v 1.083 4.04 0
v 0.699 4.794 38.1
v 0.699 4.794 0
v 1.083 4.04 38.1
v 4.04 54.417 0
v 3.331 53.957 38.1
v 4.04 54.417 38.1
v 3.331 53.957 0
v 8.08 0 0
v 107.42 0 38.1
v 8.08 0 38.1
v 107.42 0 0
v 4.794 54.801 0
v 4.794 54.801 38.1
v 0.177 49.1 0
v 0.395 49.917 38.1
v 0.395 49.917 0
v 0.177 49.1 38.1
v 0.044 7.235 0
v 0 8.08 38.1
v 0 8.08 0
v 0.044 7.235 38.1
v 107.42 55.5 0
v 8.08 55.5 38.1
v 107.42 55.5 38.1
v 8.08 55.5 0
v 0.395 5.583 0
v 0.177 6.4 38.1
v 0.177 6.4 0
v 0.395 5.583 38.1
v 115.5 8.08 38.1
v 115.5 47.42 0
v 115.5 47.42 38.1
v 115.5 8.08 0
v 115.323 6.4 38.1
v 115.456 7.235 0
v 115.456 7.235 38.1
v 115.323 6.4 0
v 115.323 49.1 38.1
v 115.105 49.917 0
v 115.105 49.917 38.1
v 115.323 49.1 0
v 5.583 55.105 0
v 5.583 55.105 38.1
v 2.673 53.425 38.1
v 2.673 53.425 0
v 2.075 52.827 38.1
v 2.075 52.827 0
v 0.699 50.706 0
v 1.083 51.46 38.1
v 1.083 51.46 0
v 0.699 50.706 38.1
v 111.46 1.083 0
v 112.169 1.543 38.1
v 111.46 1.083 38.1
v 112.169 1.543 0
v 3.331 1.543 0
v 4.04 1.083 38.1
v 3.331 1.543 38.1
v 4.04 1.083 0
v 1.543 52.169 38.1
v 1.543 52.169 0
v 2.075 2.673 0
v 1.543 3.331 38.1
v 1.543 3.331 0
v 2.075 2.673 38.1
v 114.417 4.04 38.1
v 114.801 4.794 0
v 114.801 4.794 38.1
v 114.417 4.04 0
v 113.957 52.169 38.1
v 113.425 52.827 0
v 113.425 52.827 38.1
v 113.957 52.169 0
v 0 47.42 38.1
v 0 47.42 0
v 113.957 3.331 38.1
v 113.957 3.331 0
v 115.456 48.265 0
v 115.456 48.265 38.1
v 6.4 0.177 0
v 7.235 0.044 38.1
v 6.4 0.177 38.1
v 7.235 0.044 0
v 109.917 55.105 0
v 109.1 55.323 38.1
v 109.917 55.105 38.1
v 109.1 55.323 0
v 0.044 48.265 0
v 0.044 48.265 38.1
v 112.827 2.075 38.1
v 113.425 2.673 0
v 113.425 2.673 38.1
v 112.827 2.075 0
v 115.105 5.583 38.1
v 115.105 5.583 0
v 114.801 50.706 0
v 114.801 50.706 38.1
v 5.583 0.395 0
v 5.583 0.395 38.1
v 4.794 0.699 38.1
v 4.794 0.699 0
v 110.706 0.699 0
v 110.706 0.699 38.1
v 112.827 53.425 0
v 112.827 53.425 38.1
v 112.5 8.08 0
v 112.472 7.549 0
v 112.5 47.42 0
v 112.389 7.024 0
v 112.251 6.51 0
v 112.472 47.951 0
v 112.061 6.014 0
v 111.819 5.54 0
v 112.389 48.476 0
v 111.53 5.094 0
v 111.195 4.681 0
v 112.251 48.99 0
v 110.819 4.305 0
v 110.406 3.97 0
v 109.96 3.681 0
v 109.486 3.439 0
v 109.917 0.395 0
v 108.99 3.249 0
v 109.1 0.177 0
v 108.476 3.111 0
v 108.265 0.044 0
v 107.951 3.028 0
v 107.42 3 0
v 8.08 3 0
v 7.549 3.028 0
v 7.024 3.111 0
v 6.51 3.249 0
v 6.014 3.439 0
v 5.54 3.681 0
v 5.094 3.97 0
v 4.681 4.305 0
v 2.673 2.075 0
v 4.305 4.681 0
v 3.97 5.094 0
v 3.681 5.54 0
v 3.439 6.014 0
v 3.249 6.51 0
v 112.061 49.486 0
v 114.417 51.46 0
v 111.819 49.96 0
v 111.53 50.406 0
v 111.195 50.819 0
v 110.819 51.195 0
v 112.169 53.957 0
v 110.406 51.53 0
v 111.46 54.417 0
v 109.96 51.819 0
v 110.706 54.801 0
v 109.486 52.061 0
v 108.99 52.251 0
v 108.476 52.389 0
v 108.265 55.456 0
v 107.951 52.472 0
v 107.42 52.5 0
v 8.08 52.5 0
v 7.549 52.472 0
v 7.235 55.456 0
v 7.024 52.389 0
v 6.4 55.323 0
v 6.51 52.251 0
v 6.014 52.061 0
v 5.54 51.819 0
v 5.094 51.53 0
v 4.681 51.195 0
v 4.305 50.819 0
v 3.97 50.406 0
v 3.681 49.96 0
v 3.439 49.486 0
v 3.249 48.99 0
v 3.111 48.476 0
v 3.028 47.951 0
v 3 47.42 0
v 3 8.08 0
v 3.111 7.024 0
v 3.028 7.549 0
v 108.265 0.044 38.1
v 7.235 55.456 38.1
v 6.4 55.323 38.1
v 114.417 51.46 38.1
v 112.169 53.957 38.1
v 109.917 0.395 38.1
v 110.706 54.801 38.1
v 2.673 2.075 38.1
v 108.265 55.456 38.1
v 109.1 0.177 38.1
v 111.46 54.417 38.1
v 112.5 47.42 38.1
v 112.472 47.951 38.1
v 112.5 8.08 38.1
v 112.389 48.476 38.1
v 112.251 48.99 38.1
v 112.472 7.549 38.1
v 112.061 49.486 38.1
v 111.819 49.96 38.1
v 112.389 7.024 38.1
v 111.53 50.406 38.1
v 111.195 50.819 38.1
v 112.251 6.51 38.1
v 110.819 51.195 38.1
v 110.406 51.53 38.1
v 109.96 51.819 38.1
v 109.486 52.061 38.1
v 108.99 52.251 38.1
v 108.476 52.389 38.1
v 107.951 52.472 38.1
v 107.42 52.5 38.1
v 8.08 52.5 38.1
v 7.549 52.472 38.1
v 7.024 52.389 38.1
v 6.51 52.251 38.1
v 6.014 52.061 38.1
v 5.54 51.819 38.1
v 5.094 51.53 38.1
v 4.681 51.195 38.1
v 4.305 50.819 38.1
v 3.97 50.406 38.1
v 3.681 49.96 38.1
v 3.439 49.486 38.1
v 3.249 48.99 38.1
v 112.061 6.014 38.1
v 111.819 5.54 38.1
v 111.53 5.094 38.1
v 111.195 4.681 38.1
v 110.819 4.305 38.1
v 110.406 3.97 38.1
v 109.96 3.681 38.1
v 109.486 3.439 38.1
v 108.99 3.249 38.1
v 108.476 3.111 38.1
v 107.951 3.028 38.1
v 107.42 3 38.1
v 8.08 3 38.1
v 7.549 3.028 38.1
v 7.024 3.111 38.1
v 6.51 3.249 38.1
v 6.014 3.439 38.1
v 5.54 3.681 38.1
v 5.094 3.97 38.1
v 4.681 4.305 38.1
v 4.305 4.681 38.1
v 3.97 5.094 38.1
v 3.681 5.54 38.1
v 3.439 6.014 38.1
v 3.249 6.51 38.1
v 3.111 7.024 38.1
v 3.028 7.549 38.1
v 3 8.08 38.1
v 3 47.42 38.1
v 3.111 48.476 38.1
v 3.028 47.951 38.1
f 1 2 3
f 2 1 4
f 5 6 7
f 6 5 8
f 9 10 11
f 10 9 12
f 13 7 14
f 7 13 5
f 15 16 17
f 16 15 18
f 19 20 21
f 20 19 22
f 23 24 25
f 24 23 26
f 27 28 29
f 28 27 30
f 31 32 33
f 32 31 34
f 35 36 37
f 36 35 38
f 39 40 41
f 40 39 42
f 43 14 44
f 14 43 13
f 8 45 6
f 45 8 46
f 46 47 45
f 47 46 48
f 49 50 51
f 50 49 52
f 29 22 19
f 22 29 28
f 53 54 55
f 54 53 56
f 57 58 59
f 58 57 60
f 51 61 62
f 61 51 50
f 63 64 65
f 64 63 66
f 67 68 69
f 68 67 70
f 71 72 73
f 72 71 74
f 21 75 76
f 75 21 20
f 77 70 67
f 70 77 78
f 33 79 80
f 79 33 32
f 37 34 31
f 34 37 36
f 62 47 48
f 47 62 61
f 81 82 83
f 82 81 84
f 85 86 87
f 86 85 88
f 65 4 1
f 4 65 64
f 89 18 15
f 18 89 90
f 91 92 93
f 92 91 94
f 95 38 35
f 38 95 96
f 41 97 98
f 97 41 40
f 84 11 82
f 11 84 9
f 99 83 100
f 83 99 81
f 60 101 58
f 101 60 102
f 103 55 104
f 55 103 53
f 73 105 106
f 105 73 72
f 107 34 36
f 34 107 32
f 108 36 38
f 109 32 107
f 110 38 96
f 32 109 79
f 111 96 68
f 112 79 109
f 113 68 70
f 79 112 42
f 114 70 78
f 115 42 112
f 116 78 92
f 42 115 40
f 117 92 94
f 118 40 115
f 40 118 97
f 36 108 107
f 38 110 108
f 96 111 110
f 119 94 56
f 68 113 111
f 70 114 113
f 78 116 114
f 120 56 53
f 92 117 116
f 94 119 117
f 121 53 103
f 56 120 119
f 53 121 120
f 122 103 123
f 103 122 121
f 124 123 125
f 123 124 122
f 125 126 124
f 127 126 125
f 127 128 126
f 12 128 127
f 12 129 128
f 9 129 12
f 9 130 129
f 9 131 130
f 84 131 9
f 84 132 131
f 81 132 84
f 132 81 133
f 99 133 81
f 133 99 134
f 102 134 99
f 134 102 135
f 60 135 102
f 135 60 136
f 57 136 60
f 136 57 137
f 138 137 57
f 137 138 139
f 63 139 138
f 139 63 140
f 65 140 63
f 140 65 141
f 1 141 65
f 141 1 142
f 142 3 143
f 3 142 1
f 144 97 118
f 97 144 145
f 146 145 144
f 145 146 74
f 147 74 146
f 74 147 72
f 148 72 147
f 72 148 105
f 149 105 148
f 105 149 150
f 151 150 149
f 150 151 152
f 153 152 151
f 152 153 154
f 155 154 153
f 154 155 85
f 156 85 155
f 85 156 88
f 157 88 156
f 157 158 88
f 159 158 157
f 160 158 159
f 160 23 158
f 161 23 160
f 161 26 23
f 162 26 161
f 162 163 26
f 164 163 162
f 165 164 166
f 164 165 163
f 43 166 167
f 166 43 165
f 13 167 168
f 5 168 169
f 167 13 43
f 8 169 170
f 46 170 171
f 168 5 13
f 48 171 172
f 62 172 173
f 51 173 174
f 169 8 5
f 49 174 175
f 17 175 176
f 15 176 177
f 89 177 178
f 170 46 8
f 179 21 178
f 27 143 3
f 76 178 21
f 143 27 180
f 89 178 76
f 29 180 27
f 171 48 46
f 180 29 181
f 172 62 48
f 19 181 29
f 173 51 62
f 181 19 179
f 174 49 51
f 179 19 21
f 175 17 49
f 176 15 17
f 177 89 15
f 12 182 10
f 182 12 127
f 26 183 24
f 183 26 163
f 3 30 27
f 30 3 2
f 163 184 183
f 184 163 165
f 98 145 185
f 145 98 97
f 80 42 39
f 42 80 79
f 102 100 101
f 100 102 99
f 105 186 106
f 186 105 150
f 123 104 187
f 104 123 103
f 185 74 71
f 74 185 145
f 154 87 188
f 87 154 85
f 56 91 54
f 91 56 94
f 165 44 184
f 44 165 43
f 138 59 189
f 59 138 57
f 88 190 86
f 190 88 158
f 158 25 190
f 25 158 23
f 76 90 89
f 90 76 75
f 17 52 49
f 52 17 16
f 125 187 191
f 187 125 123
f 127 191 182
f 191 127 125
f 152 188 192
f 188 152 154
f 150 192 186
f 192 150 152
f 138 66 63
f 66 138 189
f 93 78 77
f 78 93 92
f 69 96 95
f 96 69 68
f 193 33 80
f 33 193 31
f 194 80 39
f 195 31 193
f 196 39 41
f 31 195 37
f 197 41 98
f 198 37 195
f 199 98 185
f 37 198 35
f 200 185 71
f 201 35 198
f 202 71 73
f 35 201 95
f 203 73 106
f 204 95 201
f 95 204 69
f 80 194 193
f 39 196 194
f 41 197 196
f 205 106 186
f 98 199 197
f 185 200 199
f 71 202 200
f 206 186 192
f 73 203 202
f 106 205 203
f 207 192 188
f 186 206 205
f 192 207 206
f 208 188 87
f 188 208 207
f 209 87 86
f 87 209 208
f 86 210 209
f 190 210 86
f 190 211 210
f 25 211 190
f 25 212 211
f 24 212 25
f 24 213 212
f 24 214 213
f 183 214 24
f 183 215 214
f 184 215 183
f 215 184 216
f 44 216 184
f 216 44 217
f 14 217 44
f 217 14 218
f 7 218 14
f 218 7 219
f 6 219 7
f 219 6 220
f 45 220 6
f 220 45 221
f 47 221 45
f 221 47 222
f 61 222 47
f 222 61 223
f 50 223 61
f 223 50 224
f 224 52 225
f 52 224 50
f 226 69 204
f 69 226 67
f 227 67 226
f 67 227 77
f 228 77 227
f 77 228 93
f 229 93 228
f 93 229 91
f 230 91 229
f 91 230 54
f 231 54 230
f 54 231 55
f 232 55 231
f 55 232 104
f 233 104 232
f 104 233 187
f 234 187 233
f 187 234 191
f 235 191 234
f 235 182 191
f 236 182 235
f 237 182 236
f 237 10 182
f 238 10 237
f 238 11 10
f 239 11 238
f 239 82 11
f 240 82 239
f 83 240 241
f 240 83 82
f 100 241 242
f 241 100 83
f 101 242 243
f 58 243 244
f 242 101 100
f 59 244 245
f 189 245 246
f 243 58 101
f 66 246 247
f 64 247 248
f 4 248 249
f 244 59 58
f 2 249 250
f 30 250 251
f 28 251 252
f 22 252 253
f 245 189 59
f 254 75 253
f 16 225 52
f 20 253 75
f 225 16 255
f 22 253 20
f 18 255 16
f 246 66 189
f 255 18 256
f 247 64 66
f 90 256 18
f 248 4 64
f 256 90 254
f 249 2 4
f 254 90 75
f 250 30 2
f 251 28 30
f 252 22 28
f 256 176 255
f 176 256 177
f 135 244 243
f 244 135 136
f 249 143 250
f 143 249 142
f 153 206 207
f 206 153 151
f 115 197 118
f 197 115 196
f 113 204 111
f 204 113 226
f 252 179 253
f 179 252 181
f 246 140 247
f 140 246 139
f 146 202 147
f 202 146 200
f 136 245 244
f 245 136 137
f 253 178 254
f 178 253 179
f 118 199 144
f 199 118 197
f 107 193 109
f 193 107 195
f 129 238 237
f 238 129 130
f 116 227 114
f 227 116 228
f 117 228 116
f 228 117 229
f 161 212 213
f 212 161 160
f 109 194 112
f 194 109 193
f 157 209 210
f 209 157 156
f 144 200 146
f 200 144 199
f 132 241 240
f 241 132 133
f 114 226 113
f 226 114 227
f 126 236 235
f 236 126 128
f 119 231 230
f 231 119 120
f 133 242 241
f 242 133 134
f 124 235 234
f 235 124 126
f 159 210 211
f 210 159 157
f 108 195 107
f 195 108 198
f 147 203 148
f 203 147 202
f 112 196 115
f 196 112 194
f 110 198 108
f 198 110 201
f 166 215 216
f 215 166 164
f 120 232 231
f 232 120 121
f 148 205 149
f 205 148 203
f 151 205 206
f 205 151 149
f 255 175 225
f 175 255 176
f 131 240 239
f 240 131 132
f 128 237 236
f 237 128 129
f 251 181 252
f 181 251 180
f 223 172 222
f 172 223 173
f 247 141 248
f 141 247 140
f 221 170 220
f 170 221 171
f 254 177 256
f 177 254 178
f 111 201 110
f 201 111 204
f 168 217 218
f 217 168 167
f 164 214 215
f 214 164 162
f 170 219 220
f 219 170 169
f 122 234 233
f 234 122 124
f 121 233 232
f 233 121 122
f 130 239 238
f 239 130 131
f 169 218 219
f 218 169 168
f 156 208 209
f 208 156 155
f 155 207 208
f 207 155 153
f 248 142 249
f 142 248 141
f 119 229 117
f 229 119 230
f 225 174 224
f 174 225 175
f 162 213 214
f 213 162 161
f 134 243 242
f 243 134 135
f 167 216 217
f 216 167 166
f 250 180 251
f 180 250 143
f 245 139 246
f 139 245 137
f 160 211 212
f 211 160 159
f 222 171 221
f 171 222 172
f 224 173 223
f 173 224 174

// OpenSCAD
//Rain Gauge Extension
//Designed by Bryscus: Bryce B.

//Most measurements are for the inside dimensions
//since in this case those are the dimensions
//that really matter.

//Height
H=38.1;

//Wall thickness
W=3;    

//Inside Corner radius
R=5.08; 

//Inside Length
L=109.5;

//Inside Width
B=49.5;

difference(){
translate([R+W,R+W,0]) 
minkowski(){
	cube([L-2*R,B-2*R,H/2]); // Outside
	cylinder(r=R+W, h=H/2,$fn=60);
	}
translate([R+W,R+W,-1]) 
minkowski(){
	cube([L-2*R,B-2*R,H/2]); // Inside
	cylinder(r=R, h=H/2+2,$fn=60);
	}
}

//cube([115.5,55.5,H]); //Minkowski Sanity Check
//Since Minkowski does weird things, this is a
//way to guarantee that the dimensions sought
//after are what we actually get
